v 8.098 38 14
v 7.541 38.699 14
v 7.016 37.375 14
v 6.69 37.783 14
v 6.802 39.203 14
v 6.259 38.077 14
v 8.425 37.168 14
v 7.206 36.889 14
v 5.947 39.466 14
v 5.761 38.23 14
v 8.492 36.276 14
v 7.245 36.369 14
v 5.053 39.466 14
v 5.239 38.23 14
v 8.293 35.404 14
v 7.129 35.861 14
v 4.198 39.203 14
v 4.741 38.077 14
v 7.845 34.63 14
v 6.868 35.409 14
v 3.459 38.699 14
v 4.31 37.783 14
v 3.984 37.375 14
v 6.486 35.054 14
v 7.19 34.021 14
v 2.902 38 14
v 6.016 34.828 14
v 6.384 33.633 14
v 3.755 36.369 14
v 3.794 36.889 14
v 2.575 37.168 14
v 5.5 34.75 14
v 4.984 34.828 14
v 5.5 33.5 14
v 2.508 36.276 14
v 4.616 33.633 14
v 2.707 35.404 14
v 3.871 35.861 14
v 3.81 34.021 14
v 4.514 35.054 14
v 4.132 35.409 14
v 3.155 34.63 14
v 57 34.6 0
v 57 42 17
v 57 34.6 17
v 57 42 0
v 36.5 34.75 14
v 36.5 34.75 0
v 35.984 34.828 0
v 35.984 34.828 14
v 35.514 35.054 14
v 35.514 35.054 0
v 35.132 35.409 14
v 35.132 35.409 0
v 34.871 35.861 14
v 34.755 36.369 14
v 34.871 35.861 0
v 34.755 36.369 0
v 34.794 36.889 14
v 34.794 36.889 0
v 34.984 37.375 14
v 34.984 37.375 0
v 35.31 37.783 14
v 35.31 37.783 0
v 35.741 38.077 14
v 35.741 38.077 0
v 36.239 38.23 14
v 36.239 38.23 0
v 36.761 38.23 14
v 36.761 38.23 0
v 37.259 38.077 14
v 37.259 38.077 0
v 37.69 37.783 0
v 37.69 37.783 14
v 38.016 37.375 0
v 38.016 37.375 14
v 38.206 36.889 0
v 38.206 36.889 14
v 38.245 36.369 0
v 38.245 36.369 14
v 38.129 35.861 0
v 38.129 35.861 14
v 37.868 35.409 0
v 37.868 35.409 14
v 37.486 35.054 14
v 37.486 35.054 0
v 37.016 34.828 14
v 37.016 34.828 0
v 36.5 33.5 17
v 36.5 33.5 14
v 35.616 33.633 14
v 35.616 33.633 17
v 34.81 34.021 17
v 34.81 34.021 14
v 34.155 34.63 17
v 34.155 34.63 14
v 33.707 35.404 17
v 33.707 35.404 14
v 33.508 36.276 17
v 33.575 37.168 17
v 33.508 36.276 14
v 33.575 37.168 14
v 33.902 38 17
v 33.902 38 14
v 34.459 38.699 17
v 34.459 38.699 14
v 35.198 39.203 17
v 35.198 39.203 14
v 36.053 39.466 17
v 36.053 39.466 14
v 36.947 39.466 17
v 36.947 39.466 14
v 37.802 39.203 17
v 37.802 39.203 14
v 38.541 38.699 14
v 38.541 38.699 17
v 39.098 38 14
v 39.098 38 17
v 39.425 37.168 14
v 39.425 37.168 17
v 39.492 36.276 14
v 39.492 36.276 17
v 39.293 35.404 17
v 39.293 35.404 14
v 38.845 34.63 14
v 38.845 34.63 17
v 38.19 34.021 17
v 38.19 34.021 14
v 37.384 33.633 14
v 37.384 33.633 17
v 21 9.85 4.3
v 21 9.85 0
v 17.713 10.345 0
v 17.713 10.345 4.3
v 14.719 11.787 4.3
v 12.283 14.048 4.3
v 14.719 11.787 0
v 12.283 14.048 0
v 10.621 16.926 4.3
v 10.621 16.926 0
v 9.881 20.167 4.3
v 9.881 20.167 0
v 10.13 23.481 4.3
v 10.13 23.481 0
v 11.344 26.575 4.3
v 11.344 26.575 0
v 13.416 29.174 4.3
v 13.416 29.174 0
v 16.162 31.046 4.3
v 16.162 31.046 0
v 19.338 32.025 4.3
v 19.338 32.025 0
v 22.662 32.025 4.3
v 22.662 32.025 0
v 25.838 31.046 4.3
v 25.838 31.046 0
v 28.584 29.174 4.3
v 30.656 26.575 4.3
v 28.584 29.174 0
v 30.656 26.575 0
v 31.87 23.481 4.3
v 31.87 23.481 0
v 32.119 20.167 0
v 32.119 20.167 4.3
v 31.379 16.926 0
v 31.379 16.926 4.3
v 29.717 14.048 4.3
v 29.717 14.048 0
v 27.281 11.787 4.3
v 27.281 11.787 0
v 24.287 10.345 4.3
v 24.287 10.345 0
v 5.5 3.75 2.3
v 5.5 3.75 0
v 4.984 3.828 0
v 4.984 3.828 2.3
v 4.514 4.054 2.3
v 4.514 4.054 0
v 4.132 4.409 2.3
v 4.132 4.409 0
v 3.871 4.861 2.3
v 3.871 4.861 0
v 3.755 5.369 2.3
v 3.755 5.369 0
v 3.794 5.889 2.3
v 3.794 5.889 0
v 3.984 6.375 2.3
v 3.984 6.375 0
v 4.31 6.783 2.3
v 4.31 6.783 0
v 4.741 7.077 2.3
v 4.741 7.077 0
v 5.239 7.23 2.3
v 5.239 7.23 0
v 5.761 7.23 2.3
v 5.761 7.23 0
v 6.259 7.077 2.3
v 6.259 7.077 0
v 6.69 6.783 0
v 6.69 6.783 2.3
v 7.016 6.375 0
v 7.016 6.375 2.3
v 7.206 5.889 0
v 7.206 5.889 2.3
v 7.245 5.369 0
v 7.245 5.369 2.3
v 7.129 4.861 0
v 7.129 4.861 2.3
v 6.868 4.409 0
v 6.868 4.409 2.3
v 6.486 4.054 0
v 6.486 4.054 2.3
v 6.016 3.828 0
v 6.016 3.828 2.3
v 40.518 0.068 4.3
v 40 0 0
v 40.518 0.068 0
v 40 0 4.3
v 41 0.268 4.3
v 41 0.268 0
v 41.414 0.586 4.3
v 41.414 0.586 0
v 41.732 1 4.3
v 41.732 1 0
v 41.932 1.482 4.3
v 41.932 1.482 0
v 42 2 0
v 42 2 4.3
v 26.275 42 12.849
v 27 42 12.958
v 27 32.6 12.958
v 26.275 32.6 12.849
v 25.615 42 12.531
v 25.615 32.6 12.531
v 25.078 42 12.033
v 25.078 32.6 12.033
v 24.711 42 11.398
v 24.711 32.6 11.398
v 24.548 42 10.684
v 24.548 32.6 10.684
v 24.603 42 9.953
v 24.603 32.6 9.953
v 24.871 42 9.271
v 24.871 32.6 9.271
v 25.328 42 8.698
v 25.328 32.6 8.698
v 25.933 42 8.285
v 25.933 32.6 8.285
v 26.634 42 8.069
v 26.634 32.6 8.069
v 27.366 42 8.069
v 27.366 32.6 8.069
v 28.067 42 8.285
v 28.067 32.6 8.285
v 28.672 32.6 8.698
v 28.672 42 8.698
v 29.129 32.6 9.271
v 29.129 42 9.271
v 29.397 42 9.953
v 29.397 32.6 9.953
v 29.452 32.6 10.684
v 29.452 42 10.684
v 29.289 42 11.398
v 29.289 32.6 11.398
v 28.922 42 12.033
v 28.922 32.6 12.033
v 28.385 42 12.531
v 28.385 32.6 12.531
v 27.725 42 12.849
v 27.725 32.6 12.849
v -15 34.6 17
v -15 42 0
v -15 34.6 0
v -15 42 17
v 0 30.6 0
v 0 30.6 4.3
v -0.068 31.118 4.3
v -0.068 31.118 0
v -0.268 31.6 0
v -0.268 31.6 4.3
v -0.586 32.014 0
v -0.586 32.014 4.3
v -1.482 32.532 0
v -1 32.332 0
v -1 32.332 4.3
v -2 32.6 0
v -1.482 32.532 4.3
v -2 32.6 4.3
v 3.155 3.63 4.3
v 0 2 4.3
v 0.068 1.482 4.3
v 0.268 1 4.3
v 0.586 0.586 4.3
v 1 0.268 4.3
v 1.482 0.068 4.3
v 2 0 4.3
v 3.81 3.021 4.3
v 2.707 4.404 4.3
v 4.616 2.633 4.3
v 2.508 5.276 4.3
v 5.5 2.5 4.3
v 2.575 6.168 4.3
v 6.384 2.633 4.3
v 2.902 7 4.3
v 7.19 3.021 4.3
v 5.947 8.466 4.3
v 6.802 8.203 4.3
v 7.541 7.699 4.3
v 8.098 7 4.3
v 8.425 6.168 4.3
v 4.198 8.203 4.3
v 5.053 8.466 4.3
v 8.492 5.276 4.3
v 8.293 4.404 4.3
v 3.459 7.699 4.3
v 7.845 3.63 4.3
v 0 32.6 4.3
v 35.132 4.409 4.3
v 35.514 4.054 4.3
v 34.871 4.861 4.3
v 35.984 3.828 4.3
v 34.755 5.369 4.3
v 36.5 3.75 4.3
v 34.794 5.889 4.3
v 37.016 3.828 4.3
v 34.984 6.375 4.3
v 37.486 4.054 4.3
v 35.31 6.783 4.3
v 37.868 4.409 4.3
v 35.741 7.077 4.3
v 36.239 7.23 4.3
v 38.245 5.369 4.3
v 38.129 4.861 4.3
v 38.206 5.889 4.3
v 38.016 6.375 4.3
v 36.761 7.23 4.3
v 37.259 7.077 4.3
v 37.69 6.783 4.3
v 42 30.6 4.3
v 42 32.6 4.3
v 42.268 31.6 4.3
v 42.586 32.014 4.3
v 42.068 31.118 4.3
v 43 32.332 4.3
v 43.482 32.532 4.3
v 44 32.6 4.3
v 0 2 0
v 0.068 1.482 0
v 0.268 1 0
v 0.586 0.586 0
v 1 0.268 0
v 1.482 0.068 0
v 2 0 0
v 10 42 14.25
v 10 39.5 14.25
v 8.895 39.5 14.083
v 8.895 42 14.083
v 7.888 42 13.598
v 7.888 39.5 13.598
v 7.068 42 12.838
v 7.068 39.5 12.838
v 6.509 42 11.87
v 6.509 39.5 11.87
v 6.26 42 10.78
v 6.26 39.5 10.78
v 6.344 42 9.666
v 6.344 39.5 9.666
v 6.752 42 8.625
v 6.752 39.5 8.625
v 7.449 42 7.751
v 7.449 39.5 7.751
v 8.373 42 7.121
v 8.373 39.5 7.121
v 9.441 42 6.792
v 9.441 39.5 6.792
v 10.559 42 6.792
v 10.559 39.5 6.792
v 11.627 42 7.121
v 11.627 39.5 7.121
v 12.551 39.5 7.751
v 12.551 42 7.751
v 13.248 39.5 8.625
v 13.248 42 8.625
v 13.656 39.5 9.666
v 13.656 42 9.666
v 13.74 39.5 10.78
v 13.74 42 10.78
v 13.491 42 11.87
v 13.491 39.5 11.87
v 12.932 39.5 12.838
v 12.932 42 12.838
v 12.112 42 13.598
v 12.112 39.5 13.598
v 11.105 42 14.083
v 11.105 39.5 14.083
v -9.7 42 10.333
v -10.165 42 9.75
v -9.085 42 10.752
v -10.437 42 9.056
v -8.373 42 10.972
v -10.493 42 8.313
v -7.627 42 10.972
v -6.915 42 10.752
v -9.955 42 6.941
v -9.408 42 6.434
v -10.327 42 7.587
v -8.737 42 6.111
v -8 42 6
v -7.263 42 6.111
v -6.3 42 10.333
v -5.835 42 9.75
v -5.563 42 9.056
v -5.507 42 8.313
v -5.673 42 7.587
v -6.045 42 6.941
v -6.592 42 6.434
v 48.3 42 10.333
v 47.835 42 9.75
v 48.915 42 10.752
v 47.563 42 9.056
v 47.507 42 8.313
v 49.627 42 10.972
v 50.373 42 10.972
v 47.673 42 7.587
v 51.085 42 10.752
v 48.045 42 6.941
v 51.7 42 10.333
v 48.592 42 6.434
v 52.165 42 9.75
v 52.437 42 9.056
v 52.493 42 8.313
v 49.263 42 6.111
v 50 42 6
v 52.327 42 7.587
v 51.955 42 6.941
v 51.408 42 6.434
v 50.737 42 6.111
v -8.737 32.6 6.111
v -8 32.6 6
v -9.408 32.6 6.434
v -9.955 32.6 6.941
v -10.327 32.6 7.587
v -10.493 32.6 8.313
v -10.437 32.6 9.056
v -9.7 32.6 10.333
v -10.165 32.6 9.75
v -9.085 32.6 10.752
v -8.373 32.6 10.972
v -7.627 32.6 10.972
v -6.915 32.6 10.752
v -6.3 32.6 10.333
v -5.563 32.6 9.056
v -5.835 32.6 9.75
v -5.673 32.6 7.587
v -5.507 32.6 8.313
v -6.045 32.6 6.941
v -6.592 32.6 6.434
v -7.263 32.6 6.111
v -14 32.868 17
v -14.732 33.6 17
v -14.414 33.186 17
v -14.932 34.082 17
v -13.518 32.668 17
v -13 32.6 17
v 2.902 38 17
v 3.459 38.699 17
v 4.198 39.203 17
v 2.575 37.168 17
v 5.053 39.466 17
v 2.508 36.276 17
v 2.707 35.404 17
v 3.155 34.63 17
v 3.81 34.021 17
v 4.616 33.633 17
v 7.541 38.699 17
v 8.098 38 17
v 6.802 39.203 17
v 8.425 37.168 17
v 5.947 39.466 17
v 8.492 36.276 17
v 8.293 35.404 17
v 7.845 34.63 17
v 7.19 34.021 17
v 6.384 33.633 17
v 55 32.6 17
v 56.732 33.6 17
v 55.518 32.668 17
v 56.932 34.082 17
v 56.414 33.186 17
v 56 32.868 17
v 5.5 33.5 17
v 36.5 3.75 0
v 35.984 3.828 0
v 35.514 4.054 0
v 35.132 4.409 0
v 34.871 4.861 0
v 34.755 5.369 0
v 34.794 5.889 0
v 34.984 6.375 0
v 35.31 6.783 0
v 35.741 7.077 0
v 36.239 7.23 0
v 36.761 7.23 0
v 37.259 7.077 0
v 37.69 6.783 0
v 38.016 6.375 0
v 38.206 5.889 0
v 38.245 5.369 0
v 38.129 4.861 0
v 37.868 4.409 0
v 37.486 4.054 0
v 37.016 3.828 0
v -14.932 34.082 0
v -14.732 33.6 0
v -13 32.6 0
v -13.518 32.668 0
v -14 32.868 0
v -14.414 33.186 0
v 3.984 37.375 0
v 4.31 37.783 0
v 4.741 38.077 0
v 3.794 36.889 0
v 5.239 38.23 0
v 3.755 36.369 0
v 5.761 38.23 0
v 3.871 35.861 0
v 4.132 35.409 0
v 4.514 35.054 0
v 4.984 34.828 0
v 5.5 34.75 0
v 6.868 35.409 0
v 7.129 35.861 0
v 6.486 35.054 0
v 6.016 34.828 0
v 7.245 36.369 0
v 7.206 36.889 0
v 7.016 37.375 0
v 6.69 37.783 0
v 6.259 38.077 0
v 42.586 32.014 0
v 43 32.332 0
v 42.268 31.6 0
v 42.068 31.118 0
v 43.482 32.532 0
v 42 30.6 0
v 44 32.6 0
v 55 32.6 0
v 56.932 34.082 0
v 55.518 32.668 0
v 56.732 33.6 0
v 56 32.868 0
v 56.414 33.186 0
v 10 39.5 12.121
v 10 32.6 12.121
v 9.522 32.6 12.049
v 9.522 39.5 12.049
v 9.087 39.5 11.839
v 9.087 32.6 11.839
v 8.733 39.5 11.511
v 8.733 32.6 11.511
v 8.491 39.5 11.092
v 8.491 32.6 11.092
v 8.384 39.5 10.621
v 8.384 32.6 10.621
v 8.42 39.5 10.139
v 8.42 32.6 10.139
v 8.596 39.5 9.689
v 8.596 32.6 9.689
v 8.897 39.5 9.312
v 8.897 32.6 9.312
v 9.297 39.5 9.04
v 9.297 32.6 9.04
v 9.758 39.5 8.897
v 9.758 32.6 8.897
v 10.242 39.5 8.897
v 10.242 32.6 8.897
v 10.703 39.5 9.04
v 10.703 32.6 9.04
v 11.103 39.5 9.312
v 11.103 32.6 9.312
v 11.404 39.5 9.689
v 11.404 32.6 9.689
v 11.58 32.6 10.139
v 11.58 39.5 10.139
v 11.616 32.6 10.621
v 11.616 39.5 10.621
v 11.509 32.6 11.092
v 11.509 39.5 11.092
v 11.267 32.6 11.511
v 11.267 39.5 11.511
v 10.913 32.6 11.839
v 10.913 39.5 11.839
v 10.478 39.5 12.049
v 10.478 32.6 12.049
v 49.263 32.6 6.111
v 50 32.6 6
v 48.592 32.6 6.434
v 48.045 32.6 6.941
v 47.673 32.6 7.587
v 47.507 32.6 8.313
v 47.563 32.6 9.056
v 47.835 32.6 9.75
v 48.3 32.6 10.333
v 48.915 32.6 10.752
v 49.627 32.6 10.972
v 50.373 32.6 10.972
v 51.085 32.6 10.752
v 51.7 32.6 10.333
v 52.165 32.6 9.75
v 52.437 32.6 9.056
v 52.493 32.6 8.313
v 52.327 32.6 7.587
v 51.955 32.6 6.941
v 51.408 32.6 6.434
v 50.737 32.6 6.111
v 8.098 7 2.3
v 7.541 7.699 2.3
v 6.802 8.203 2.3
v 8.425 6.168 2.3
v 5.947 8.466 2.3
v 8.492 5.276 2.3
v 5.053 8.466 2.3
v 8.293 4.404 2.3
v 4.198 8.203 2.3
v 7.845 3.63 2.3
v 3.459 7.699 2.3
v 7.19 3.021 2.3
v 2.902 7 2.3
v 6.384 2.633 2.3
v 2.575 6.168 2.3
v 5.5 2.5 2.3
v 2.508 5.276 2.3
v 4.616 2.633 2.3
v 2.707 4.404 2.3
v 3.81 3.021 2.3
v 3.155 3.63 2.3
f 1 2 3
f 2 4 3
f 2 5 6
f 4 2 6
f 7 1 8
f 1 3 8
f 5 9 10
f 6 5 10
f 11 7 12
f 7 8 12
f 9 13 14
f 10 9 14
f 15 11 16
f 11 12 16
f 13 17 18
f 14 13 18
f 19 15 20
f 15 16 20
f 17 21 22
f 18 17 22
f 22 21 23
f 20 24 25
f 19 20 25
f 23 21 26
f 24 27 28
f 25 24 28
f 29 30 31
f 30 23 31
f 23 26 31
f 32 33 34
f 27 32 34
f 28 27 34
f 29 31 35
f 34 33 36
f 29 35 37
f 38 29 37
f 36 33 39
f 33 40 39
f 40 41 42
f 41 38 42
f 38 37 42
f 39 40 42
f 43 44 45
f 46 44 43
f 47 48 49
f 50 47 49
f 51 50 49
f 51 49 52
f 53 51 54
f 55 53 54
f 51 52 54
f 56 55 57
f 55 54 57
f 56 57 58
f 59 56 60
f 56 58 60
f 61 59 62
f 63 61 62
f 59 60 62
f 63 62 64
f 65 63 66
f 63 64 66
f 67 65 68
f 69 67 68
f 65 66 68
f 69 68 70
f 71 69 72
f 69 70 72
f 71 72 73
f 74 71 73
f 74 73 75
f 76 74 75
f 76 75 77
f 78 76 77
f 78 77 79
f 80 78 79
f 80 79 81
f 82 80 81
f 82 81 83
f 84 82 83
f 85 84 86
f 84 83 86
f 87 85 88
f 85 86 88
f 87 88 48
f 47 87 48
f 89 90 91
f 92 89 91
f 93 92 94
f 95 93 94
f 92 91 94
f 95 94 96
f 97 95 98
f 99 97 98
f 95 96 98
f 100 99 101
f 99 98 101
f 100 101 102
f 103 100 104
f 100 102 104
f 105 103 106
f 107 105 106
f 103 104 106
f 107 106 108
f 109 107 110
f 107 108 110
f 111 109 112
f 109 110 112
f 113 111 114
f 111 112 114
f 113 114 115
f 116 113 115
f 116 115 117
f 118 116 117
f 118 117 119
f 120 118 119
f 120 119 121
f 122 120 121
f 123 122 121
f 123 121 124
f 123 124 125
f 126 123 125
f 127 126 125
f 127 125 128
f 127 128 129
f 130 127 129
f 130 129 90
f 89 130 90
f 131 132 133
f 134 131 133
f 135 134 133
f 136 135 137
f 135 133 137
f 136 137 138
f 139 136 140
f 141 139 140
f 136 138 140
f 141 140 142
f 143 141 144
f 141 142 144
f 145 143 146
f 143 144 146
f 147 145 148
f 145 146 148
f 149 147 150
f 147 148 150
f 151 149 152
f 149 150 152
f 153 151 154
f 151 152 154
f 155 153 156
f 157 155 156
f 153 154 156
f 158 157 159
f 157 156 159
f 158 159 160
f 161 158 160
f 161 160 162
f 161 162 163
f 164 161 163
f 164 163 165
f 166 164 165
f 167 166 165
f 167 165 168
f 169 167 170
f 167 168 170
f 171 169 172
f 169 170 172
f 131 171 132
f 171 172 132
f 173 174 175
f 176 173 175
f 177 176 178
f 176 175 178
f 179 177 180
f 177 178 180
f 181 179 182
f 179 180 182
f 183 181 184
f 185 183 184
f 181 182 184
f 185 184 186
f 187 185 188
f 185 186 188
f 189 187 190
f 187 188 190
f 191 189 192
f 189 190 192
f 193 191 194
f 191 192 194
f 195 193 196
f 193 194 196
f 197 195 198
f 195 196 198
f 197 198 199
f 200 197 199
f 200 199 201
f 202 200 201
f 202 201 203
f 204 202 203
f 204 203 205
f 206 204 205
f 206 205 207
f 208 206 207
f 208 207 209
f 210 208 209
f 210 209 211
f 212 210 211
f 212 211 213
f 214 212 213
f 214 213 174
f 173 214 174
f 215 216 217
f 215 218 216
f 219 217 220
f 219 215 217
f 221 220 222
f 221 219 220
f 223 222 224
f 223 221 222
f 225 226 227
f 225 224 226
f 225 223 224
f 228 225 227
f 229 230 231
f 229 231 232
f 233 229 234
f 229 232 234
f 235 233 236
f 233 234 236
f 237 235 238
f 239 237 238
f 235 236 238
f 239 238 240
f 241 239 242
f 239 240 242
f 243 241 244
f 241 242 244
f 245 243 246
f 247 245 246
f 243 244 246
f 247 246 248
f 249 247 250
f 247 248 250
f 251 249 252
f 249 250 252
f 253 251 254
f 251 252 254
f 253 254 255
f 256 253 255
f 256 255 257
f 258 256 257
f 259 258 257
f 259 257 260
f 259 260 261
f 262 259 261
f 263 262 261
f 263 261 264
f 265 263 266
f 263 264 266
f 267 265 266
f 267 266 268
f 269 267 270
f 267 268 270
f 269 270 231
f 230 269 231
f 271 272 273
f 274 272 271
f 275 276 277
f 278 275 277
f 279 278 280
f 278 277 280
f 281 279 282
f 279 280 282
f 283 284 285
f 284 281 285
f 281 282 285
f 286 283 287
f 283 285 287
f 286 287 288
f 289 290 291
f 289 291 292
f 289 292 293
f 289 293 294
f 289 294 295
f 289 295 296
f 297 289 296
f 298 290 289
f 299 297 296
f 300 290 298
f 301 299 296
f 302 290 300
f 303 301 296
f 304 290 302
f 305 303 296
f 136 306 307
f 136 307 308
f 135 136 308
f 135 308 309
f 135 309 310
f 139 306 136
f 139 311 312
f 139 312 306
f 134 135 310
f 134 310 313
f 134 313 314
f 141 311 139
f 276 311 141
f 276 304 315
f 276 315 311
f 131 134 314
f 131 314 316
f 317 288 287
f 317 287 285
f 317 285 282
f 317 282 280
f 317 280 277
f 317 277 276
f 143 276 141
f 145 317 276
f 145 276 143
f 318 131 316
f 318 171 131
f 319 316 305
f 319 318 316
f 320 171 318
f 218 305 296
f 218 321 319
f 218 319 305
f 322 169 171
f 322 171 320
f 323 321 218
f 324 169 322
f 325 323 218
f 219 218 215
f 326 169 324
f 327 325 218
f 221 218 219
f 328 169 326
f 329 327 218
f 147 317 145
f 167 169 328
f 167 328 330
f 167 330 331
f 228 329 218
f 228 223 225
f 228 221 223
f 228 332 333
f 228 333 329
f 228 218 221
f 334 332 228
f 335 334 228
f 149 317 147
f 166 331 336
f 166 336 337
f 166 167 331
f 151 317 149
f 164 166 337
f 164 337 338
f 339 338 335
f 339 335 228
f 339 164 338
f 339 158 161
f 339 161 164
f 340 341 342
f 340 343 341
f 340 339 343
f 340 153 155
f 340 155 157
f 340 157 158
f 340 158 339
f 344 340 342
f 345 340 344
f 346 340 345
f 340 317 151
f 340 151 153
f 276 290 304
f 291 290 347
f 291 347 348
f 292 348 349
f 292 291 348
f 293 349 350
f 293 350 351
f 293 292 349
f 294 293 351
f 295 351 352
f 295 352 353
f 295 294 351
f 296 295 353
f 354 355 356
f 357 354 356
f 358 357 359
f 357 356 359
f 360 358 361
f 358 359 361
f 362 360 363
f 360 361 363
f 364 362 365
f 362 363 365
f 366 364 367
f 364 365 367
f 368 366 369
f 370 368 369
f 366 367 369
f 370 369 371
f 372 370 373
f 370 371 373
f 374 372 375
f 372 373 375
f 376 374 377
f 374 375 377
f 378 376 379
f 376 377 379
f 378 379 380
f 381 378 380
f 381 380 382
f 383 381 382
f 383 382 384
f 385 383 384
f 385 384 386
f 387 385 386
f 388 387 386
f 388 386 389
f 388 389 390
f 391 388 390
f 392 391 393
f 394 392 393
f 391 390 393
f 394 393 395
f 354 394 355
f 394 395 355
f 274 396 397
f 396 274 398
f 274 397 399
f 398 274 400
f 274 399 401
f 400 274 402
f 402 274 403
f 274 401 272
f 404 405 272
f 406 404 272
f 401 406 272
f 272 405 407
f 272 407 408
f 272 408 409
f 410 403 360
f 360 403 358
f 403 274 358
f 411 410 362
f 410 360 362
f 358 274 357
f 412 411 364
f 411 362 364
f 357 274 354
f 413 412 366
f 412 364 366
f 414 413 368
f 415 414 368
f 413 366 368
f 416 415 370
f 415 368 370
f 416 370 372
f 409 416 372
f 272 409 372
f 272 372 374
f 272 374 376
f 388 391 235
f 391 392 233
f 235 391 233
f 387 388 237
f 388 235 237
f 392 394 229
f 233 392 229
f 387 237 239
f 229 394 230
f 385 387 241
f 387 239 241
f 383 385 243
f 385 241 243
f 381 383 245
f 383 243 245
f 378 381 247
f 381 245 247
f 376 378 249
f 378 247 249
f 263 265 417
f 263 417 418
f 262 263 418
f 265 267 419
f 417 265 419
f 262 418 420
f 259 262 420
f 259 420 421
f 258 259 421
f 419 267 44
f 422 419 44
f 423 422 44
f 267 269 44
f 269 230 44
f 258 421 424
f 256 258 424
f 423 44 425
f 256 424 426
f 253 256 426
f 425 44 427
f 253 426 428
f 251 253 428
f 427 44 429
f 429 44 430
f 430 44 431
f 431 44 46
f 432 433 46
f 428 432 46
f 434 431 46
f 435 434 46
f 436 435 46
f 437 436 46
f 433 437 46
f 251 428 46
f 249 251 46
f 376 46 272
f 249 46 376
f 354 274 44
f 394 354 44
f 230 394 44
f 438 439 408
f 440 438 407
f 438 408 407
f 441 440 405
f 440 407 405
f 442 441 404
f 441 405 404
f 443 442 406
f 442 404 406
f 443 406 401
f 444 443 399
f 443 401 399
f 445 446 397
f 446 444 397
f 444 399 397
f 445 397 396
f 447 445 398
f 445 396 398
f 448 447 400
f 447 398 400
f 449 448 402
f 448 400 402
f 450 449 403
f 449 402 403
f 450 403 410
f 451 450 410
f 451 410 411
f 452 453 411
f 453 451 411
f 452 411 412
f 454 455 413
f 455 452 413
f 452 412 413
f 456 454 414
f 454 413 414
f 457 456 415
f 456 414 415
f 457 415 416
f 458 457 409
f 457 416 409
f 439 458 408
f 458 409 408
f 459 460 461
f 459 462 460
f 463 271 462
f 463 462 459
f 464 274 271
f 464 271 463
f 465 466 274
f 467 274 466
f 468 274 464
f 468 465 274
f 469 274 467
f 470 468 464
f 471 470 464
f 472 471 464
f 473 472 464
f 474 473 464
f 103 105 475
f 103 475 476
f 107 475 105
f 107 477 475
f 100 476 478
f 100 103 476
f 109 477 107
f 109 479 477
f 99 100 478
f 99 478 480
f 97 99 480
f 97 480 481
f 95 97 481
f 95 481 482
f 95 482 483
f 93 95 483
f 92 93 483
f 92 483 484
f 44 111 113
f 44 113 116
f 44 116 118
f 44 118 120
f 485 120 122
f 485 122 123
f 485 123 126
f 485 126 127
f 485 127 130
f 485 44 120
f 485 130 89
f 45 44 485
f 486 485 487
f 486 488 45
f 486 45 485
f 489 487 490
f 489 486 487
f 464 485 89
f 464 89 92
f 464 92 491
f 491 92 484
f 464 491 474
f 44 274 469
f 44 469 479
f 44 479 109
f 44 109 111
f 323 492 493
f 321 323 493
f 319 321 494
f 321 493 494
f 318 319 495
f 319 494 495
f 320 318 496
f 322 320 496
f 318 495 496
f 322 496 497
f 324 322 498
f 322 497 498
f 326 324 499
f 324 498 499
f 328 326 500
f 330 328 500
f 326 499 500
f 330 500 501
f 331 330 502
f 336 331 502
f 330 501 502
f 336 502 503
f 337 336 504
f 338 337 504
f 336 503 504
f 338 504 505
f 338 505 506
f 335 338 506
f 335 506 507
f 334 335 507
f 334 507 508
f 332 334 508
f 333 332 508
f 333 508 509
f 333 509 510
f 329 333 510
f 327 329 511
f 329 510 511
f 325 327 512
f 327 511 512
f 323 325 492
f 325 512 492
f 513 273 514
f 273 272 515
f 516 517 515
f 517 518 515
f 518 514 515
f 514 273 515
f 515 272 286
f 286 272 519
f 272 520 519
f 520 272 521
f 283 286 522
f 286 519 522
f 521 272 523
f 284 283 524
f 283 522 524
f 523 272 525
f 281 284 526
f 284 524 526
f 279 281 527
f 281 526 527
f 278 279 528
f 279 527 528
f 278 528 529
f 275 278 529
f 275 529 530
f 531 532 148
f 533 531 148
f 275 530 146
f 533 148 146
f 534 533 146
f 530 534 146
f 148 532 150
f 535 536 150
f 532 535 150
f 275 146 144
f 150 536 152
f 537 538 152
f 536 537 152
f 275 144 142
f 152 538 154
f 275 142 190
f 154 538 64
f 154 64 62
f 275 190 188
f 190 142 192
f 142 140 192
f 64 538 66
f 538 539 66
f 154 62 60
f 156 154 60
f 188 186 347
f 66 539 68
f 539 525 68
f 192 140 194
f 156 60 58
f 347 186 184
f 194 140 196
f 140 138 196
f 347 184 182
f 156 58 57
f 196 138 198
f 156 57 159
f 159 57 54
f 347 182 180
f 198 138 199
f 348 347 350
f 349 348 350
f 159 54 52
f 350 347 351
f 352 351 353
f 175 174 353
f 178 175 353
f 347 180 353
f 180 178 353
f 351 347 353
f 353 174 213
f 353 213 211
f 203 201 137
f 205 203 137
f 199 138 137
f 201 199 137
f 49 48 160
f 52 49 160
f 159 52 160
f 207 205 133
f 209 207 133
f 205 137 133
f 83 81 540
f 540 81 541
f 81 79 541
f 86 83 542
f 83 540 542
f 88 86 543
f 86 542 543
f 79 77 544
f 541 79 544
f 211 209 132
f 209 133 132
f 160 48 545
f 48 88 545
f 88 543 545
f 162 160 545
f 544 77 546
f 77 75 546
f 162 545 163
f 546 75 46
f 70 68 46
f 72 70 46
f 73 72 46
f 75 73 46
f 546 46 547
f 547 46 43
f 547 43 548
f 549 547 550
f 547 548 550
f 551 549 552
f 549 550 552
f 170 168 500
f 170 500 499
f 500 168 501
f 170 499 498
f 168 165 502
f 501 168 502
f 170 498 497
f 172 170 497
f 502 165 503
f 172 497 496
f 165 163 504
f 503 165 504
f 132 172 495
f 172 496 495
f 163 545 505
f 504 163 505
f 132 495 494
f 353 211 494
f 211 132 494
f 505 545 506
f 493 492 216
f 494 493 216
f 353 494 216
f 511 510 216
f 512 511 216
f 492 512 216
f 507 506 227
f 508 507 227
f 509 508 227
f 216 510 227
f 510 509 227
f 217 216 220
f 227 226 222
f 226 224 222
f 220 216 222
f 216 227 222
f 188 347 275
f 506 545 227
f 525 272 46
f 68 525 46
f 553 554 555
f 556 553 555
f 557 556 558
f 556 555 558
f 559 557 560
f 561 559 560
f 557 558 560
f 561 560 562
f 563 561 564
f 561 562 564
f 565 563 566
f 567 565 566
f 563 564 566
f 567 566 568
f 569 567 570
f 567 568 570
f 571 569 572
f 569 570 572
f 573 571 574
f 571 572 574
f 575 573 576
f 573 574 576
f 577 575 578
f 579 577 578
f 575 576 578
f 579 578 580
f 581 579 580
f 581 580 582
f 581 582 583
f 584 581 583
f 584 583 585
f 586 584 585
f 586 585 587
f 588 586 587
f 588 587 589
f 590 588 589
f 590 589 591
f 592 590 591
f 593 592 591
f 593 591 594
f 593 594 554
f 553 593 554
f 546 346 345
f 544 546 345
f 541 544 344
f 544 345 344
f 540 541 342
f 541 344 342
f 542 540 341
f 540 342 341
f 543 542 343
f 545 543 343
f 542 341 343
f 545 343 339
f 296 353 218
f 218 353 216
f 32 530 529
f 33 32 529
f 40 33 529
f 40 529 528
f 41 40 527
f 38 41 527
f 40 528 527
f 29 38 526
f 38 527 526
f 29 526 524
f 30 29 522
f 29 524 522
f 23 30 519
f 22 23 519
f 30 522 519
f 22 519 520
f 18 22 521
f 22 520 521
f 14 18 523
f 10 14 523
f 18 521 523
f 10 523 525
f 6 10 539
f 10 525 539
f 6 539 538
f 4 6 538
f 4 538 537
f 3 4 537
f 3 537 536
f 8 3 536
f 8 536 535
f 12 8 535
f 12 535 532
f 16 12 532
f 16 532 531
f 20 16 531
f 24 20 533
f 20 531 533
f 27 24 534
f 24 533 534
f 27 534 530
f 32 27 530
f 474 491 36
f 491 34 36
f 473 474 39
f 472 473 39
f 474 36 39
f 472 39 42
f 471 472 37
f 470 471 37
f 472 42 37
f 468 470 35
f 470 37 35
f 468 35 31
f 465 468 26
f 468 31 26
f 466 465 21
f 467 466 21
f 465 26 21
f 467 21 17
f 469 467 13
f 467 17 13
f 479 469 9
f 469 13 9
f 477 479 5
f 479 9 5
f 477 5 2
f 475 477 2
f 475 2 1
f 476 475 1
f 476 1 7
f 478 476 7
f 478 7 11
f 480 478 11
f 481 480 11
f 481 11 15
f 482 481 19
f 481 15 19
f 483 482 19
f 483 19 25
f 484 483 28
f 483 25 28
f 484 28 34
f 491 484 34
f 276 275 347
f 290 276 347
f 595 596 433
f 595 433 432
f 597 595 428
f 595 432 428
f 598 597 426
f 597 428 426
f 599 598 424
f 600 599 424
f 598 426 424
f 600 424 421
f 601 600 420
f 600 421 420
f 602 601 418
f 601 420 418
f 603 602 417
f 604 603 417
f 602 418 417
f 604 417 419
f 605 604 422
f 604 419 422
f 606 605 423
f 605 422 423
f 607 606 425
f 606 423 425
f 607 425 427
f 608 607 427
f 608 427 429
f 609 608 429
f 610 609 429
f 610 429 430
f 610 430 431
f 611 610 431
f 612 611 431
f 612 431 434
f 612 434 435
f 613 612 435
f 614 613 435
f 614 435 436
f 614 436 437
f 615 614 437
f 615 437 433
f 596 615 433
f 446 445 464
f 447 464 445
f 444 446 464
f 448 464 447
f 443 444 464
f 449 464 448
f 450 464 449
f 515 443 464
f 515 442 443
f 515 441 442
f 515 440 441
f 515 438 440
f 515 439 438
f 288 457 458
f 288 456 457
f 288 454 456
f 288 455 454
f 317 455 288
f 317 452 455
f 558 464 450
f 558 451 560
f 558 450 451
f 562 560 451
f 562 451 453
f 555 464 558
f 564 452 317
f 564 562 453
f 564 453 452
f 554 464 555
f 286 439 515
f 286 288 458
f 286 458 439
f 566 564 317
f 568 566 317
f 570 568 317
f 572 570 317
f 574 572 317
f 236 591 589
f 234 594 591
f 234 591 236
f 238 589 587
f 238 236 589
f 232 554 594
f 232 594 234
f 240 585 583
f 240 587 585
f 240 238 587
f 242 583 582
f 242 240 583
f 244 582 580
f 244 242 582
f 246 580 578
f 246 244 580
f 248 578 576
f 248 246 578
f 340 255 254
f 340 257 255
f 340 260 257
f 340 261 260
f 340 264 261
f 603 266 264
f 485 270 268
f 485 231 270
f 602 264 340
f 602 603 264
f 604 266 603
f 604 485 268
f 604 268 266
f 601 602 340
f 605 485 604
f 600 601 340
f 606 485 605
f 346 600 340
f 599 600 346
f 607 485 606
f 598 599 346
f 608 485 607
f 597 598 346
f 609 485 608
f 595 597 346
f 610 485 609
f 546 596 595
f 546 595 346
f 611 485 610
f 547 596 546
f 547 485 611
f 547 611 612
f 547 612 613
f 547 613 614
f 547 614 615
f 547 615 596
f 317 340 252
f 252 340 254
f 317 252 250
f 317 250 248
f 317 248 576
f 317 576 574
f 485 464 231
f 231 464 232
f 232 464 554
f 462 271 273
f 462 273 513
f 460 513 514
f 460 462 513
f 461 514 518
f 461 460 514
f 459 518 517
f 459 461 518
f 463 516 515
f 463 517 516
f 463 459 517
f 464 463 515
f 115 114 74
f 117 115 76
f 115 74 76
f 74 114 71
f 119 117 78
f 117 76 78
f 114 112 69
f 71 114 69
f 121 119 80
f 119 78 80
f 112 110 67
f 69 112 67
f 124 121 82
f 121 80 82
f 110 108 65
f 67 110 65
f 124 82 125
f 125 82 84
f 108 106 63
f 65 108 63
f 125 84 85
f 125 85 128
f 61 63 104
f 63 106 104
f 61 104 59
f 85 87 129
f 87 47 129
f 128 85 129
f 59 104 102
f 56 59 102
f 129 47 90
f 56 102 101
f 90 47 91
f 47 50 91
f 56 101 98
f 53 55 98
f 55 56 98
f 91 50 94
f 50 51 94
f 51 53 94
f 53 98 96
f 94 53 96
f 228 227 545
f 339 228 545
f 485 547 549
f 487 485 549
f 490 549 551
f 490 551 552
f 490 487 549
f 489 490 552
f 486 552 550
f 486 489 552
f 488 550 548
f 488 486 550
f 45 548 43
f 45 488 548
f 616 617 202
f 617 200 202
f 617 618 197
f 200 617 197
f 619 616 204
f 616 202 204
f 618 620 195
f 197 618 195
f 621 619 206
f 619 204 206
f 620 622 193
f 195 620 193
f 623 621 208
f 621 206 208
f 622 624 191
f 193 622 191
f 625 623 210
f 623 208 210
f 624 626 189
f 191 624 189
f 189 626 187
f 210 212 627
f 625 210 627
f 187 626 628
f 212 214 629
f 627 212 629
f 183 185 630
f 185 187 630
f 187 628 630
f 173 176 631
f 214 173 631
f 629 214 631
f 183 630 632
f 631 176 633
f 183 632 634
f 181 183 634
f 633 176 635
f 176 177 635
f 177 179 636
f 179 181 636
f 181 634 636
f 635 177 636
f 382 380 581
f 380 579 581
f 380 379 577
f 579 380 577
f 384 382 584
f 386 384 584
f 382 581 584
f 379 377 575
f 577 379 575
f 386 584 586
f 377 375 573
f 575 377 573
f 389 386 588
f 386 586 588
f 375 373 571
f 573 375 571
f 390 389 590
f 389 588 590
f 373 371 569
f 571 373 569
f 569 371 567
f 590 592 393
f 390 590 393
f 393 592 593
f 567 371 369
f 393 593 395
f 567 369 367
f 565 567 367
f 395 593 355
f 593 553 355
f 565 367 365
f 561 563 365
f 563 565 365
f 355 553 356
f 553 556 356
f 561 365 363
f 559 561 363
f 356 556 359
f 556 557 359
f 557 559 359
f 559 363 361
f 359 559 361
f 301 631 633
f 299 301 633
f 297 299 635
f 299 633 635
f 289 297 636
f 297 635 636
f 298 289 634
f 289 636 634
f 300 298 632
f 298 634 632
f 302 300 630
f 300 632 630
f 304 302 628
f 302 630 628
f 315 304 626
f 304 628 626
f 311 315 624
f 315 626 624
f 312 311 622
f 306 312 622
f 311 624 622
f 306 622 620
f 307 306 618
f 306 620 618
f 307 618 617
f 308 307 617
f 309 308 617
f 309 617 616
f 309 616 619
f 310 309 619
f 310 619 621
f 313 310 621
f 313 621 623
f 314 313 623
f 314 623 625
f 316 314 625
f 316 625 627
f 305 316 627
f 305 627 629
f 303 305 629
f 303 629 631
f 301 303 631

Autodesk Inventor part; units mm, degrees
ref_plane "YZ Plane" through (0, 0, 0) normal (1, 0, 0) x (0, 1, 0)
ref_plane "XZ Plane" through (0, 0, 0) normal (0, 1, 0) x (-1, 0, 0)
sketch "Sketch1" plane through (0, 0, 0) normal (0, 0, 1) x (1, 0, 0)
  line L0 (0, 0) -> (42, 0)
  line L1 (42, 0) -> (42, 42)
  line L2 (42, 42) -> (0, 42)
  line L3 (0, 42) -> (0, 0)
  dimension "d0" = 42
  dimension "d1" = 42
extrude "Extrusion1" add sketch "Sketch1" along normal blind 4.3
sketch "Sketch2" plane through (0, 0, 4.3) normal (0, 0, 1) x (1, 0, 0)
  line L0 (0, 42) -> (0, 0) projected
  line L1 (42, 0) -> (42, 42) projected
  line L2 (0, 42) -> (42, 42)
  line L3 (42, 42) -> (42, 32.6)
  line L4 (42, 32.6) -> (0, 32.6)
  line L5 (0, 32.6) -> (0, 42)
  dimension "d4" = 9.4
extrude "Extrusion2" add sketch "Sketch2" along normal blind 12.7
sketch "Sketch3" plane through (0, 0, 4.3) normal (0, 0, 1) x (1, 0, 0)
  line L0 (0, 32.6) -> (0, 0) projected
  line L1 (0, 0) -> (42, 0) projected
  point P0 (21, 21)
  dimension "d7" = 21
  dimension "d8" = 21
hole "Hole1" at (21, 21, 4.3) direction (0, 0, -1) diameter 22.3 end through all
sketch "Sketch4" plane through (0, 0, 17) normal (0, 0, 1) x (1, 0, 0)
  line L0 (42, 42) -> (0, 42) projected
  line L1 (0, 42) -> (0, 32.6) projected
  line L2 (42, 32.6) -> (42, 42) projected
  line L3 (0, 0) -> (42, 0) projected
  point P0 (5.5, 36.5)
  point P1 (36.5, 36.5)
  dimension "d16" = 5.5
  dimension "d17" = 5.5
  dimension "d18" = 5.5
  dimension "d21" = 5.5
hole "Hole2" at (5.5, 36.5, 17) at (36.5, 36.5, 17) direction (0, 0, -1) diameter 3.5 end through all counterbore diameter 6 counterbore depth 3
sketch "Sketch5" plane through (0, 0, 4.3) normal (0, 0, 1) x (1, 0, 0)
  line L0 (0, 0) -> (42, 0) projected
  line L1 (0, 32.6) -> (0, 0) projected
  point P0 (5.5, 5.5)
  dimension "d31" = 5.5
  dimension "d32" = 5.5
hole "Hole3" at (5.5, 5.5, 4.3) direction (0, 0, -1) diameter 3.5 end through all counterbore diameter 6 counterbore depth 2
sketch "Sketch6" plane through (0, 0, 4.3) normal (0, 0, 1) x (1, 0, 0)
  line L0 (42, 0) -> (42, 32.6) projected
  line L1 (0, 0) -> (42, 0) projected
  point P0 (36.5, 5.5)
  dimension "d40" = 5.5
  dimension "d41" = 5.5
hole "Hole4" at (36.5, 5.5, 4.3) direction (0, 0, -1) diameter 3.5 end through all
sketch "Sketch7" plane through (0, 42, 0) normal (0, 1, 0) x (1, 0, 0)
  line L0 (0, -17) -> (42, -17) projected
  line L1 (42, 0) -> (42, -17) projected
  point P0 (0, 0)
  point P1 (27, -10.5)
  dimension "d49" = 6.5
  dimension "d50" = 15
hole "Hole5" at (27, 42, 10.5) direction (0, -1, 0) diameter 4.917 end through all thread size "M6x1" class "6H" standard "ISO Metric profile"
sketch "Sketch8" plane through (0, 42, 0) normal (0, 1, 0) x (1, 0, 0)
  line L0 (42, -17) -> (0, -17) projected
  line L1 (0, -4.3) -> (0, -17) projected
  point P0 (0, 0)
  point P1 (10, -10.5)
  dimension "d58" = 6.5
  dimension "d59" = 10
hole "Hole6" at (10, 42, 10.5) direction (0, -1, 0) diameter 3.242 end through all counterbore diameter 7.5 counterbore depth 2.5 thread size "M4x0.7" class "6H" standard "ISO Metric profile"
sketch "Sketch9" plane through (42, 0, 0) normal (1, 0, 0) x (0, 0, -1)
  line L0 (-17, 32.6) -> (-17, 42) projected
  line L1 (0, 32.6) -> (-17, 32.6)
  line L2 (0, 42) -> (-17, 42) projected
  line L3 (0, 0) -> (0, 42)
extrude "Extrusion3" add sketch "Sketch9" along normal blind 15
sketch "Sketch10" plane through (0, 32.6, 4.3) normal (0, -1, 0) x (1, 0, 0)
  circle A0 centre (50, 4.2) radius 2.5
  line L0 (0, 12.7) -> (57, 12.7) projected
  line L1 (57, 12.7) -> (57, -4.3) projected
  point P0 (0, -4.3)
  dimension "d70" = 5
  dimension "d71" = 8.5
  dimension "d72" = 17
  dimension "d73" = 7
hole "Hole7" at (50, 32.6, 8.5) direction (0, 1, 0) diameter 5 end through all
ref_plane "Work Plane1" through (21, 0, 4.3) normal (1, 0, 0) x (0, 0, -1)
mirror "Mirror1" about plane through (21, 0, 4.3) normal (1, 0, 0) of "Hole7", "Extrusion3"
fillet "Fillet2" radius 2 6 edges at (-15, 32.6, 8.5) (0, 32.6, 2.15) (0, 0, 2.15) (42, 0, 2.15) (42, 32.6, 2.15) (57, 32.6, 8.5)
sketch "Sketch11" plane through (0, 0, 4.3) normal (0, 0, 1) x (1, 0, 0)
  line L0 (-6.1242, 27.6) -> (48.7334, 27.6)
  line L1 (55, 32.6) -> (-13, 32.6)
  line L2 (0, 27.6) -> (0, 2)
  arc A0 (0, 2) -> (2, 0) centre (2, 2) ccw
  line L3 (2, 0) -> (40, 0)
  arc A1 (40, 0) -> (42, 2) centre (40, 2) ccw
  line L4 (42, 2) -> (42, 27.6)
  point P0 (0, 0)
  dimension "d82" = 5
equation "\"d71\" = 0.5 * d72"
